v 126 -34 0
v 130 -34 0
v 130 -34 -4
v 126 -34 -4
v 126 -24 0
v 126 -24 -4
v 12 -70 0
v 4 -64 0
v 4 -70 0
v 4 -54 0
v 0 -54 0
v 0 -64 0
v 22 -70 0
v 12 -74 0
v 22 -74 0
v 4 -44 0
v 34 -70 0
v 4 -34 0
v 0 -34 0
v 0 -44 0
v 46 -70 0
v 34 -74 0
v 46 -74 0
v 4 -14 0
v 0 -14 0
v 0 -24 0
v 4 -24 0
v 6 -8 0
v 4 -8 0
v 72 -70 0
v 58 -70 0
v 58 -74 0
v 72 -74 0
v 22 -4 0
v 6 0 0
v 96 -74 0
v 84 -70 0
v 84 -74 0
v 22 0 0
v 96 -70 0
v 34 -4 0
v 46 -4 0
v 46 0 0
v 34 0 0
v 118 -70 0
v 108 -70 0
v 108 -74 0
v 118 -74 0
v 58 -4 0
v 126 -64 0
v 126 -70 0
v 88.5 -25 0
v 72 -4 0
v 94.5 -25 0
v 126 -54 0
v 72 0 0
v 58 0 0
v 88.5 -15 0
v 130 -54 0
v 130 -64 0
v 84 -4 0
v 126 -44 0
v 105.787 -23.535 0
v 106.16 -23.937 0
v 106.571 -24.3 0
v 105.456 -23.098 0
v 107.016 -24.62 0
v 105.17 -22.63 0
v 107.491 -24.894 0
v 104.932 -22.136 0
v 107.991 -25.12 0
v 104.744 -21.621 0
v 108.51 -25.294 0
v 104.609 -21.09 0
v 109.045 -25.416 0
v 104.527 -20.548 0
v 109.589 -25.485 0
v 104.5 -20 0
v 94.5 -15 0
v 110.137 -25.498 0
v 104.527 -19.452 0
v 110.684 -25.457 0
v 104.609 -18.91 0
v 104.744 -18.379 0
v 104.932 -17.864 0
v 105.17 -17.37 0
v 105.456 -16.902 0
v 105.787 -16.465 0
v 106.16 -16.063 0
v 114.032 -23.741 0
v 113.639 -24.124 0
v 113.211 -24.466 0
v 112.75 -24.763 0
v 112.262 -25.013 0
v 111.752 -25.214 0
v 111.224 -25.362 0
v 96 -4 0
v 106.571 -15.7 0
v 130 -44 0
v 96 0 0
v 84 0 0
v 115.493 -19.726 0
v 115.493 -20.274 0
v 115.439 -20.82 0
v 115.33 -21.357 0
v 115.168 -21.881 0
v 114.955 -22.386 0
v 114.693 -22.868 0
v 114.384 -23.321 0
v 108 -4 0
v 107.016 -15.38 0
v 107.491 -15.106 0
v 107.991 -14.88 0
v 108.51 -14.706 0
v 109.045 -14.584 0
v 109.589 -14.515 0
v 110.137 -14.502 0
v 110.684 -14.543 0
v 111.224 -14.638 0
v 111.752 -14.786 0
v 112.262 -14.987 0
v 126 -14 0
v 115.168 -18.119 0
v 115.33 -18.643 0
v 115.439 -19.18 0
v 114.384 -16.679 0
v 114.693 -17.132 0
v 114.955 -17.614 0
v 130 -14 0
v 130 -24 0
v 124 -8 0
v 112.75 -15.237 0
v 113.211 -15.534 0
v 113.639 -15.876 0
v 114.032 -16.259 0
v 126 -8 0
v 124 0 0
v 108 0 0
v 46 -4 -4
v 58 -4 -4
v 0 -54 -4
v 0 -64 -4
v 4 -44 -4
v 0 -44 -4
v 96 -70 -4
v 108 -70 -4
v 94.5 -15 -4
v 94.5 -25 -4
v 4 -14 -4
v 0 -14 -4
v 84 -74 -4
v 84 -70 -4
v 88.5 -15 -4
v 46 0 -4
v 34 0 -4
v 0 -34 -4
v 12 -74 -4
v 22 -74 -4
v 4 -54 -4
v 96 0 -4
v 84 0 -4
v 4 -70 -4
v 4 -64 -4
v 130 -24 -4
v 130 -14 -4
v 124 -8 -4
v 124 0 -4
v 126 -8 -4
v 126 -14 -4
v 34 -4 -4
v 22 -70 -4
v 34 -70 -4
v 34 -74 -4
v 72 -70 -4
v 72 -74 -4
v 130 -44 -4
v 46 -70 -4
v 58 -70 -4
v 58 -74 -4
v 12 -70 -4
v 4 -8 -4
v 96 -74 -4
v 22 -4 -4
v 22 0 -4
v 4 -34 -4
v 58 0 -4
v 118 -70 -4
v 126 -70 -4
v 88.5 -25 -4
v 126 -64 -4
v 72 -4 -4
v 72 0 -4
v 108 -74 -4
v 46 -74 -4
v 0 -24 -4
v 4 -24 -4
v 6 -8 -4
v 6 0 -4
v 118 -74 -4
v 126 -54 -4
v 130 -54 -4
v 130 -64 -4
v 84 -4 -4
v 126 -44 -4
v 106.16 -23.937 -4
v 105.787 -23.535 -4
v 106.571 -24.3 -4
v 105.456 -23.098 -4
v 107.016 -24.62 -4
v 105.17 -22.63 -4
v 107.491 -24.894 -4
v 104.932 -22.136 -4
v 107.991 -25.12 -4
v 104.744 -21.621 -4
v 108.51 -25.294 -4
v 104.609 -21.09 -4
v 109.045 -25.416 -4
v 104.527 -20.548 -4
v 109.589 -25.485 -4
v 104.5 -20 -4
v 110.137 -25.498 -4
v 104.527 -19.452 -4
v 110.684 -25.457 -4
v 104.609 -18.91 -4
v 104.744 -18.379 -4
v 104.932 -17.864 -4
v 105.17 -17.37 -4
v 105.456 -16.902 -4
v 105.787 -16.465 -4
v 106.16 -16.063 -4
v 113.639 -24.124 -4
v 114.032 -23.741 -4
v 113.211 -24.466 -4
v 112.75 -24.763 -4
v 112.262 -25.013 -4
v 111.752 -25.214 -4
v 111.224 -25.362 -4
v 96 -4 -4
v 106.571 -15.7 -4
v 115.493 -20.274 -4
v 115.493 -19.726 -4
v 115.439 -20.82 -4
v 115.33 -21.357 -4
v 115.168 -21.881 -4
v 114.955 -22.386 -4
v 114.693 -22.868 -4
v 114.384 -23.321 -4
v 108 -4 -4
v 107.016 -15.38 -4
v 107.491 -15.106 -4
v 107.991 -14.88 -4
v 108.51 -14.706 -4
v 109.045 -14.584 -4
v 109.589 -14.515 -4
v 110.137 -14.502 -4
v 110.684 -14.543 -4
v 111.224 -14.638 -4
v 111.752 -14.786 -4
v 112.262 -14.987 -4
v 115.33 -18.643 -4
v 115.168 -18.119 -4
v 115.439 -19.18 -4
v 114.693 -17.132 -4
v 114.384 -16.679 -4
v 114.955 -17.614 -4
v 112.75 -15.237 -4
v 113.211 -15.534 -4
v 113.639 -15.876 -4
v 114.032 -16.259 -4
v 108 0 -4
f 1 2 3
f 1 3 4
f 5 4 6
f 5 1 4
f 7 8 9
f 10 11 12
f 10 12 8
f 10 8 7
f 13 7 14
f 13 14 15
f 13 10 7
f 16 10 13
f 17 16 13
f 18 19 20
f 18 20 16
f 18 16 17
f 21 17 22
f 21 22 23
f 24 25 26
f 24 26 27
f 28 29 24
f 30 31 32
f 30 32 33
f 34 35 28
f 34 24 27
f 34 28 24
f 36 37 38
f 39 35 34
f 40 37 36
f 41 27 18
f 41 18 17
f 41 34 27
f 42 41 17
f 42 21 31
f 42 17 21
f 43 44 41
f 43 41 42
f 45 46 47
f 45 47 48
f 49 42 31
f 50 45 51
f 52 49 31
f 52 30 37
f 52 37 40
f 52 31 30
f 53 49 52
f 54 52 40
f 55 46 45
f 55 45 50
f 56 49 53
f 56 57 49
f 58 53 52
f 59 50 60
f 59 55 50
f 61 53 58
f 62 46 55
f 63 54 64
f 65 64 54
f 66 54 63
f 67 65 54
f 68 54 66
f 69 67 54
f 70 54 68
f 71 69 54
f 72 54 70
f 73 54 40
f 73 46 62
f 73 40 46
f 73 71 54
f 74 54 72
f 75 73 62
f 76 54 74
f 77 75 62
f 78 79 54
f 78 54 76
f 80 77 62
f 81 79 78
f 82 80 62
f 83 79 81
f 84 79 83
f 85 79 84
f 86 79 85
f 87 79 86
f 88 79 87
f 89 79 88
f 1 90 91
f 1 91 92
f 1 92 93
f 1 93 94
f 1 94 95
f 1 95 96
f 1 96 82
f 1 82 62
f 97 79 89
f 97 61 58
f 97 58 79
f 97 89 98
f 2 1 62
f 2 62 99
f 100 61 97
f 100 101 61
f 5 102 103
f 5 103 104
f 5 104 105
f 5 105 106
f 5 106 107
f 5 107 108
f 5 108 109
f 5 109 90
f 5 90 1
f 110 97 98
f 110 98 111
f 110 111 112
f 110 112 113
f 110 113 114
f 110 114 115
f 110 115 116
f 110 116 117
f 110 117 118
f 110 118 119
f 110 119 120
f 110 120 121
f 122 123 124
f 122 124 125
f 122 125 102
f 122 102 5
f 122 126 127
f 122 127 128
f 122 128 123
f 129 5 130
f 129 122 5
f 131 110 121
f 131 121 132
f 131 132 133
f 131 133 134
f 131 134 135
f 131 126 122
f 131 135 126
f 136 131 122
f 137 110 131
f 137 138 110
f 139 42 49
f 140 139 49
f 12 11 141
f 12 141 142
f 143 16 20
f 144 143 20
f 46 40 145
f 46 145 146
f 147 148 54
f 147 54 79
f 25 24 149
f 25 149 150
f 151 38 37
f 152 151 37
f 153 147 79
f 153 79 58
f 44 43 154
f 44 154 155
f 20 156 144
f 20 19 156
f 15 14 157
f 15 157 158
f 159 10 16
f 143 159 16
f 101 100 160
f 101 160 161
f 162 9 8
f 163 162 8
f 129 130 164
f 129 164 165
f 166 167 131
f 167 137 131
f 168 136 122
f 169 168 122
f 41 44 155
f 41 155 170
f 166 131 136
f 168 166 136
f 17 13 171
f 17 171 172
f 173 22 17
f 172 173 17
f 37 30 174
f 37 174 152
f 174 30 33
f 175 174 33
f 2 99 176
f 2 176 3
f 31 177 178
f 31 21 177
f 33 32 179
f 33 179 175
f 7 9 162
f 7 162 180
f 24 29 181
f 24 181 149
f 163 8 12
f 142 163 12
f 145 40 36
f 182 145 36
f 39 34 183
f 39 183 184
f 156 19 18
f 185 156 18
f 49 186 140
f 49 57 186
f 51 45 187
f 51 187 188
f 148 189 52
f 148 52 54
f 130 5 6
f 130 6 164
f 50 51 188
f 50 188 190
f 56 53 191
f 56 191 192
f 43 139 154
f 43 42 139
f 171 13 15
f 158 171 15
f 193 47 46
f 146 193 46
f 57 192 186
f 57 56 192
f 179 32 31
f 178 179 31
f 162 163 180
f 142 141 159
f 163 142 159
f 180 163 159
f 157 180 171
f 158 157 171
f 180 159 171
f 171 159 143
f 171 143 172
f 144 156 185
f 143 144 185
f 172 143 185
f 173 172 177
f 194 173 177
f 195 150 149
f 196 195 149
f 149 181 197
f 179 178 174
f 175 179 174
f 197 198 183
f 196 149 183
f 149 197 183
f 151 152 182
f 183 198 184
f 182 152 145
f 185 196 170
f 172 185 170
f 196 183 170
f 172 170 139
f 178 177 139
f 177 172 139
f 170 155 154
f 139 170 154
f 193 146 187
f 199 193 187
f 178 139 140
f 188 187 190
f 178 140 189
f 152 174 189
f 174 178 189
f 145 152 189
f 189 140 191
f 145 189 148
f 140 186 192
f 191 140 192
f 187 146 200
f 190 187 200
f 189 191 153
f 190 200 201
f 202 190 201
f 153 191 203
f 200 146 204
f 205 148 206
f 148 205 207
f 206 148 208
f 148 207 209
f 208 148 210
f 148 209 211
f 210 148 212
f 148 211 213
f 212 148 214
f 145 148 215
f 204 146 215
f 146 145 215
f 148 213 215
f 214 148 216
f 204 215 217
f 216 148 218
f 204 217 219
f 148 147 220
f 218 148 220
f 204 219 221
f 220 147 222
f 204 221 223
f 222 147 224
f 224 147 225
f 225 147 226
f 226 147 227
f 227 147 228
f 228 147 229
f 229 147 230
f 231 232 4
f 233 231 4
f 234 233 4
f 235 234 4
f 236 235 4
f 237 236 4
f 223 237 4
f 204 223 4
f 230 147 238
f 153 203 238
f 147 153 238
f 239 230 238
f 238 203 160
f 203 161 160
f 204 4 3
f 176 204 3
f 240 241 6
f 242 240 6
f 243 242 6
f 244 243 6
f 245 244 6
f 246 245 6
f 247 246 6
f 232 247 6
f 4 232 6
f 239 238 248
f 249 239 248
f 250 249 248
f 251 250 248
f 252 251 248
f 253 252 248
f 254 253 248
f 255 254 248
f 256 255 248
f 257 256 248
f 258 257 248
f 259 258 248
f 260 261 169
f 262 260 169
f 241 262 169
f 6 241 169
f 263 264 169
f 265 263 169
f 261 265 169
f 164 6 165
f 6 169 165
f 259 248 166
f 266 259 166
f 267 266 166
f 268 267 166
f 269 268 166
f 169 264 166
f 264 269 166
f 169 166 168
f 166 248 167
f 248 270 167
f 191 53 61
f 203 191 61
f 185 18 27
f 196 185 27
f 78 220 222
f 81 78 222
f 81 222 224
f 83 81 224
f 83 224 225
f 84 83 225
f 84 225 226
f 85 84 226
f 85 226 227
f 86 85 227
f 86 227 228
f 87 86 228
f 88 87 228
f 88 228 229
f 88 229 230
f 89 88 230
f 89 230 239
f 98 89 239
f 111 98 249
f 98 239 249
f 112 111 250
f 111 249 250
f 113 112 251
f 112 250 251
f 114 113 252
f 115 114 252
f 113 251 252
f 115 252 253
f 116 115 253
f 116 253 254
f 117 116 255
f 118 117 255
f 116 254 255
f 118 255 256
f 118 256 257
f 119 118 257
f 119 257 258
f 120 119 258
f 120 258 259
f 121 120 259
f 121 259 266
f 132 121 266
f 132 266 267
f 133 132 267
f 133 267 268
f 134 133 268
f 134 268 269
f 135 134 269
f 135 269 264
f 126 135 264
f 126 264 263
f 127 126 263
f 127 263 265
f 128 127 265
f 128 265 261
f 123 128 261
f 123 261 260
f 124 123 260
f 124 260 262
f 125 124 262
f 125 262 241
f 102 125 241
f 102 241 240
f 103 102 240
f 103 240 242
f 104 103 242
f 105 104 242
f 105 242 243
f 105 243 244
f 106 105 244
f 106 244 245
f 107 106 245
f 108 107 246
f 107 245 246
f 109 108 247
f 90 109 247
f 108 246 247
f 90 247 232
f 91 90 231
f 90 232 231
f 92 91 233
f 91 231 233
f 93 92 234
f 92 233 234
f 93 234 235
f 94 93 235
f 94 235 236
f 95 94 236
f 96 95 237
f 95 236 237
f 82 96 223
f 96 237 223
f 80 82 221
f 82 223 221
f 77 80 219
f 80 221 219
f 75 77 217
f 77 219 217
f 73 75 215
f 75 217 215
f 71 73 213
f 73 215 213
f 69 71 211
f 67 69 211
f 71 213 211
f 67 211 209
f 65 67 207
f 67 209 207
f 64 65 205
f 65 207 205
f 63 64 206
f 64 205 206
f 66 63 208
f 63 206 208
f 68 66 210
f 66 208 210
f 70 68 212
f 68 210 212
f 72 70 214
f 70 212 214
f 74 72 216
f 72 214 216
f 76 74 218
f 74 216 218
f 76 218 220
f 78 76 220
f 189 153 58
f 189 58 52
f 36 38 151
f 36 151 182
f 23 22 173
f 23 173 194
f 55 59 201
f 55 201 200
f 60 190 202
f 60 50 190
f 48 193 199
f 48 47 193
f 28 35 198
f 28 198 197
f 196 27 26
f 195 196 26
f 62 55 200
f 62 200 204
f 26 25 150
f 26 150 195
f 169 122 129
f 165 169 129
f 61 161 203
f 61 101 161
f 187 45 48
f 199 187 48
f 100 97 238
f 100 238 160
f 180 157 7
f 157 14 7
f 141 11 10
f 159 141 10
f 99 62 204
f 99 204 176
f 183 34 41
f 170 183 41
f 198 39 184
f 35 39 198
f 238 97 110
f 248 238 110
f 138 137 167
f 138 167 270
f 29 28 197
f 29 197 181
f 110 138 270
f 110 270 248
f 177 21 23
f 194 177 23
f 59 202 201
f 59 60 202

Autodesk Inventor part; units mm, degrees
ref_plane "YZ Plane" through (0, 0, 0) normal (1, 0, 0) x (0, 1, 0)
ref_plane "XZ Plane" through (0, 0, 0) normal (0, 1, 0) x (-1, 0, 0)
ref_plane "XY Plane" through (0, 0, 0) normal (0, 0, 1) x (1, 0, 0)
sketch "Sketch1" plane through (0, 0, 0) normal (0, 0, 1) x (1, 0, 0)
  line L0 (0, -74) -> (130, -74)
  line L1 (130, -74) -> (130, 0)
  line L2 (130, 0) -> (0, 0)
  line L3 (0, 0) -> (0, -74)
  dimension "d228" = 130
  dimension "d229" = 74
extrude "Extrusion1" add sketch "Sketch1" against normal blind 4
sketch "Sketch2" plane through (0, 0, 0) normal (0, 0, 1) x (1, 0, 0)
  line L0 (0, -74) -> (0, 0) projected
  line L1 (0, -37) -> (130, -37)
  line L2 (130, 0) -> (130, -74) projected
  line L3 (65, 0) -> (65, -74)
  line L4 (130, -74) -> (0, -74) projected
  line L5 (22, -74) -> (12, -74)
  line L6 (12, -74) -> (12, -70)
  line L7 (22, -70) -> (22, -74)
  line L8 (46, -70) -> (46, -74)
  line L9 (46, -74) -> (34, -74)
  line L10 (34, -74) -> (34, -70)
  line L11 (72, -70) -> (72, -74)
  line L12 (72, -74) -> (58, -74)
  line L13 (58, -74) -> (58, -70)
  line L14 (0, -74) -> (130, -74) projected
  line L15 (96, -74) -> (84, -74)
  line L16 (84, -74) -> (84, -70)
  line L17 (96, -70) -> (96, -74)
  line L18 (118, -70) -> (118, -74)
  line L19 (118, -74) -> (108, -74)
  line L20 (108, -74) -> (108, -70)
  line L21 (0, -54) -> (4, -54)
  line L22 (4, -54) -> (4, -44)
  line L23 (4, -44) -> (0, -44)
  line L24 (0, -44) -> (0, -54)
  line L25 (0, -34) -> (4, -34)
  line L26 (4, -34) -> (4, -24)
  line L27 (4, -24) -> (0, -24)
  line L28 (0, -24) -> (0, -34)
  line L29 (0, 0) -> (0, -74) projected
  line L30 (130, -74) -> (130, 0)
  line L31 (130, 0) -> (130, -74)
  line L32 (0, -70) -> (12, -70)
  line L33 (22, -70) -> (34, -70)
  line L34 (46, -70) -> (58, -70)
  line L35 (72, -70) -> (84, -70)
  line L36 (96, -70) -> (108, -70)
  line L37 (118, -70) -> (130, -70)
  line L38 (0, 0) -> (0, -74)
  line L39 (6, 0) -> (6, -8)
  line L40 (22, -4) -> (22, 0)
  line L41 (46, -4) -> (46, 0)
  line L42 (46, 0) -> (34, 0)
  line L43 (34, 0) -> (34, -4)
  line L44 (72, -4) -> (72, 0)
  line L45 (72, 0) -> (58, 0)
  line L46 (58, 0) -> (58, -4)
  line L47 (96, -4) -> (96, 0)
  line L48 (108, 0) -> (108, -4)
  line L49 (96, 0) -> (84, 0)
  line L50 (84, 0) -> (84, -4)
  line L51 (0, -74) -> (0, 0)
  line L52 (130, 0) -> (130, -74)
  line L53 (130, -74) -> (130, 0)
  line L54 (22, -4) -> (34, -4)
  line L55 (46, -4) -> (58, -4)
  line L56 (72, -4) -> (84, -4)
  line L57 (96, -4) -> (108, -4)
  line L58 (130, -74) -> (130, 0)
  line L59 (130, 0) -> (130, -74)
  line L60 (130, 0) -> (130, -74)
  line L61 (130, -74) -> (130, 0)
  line L62 (0, -70) -> (4, -70)
  line L63 (4, -70) -> (4, -64)
  line L64 (4, -64) -> (0, -64)
  line L65 (0, -64) -> (0, -70)
  line L66 (0, -4) -> (4, -4)
  line L67 (4, -4) -> (4, -14)
  line L68 (4, -14) -> (0, -14)
  line L69 (0, -14) -> (0, -4)
  line L70 (130, -74) -> (130, 0)
  line L71 (130, -54) -> (126, -54)
  line L72 (126, -54) -> (126, -44)
  line L73 (126, -44) -> (130, -44)
  line L74 (130, -44) -> (130, -54)
  line L75 (126, -34) -> (126, -24)
  line L76 (130, -34) -> (126, -34)
  line L77 (126, -24) -> (130, -24)
  line L78 (130, -24) -> (130, -34)
  line L79 (130, 0) -> (130, -74)
  line L80 (130, 0) -> (130, -74)
  line L81 (130, -74) -> (130, 0)
  line L82 (130, -70) -> (126, -70)
  line L83 (126, -70) -> (126, -64)
  line L84 (126, -64) -> (130, -64)
  line L85 (130, -64) -> (130, -70)
  line L86 (130, -4) -> (126, -4)
  line L87 (126, -4) -> (126, -14)
  line L88 (126, -14) -> (130, -14)
  line L89 (130, -14) -> (130, -4)
  line L90 (130, 0) -> (0, 0) projected
  line L91 (6, -8) -> (0, -8)
  line L92 (124, 0) -> (124, -8)
  line L93 (124, -8) -> (130, -8)
  point P0 (58, -74)
  point P1 (72, -74)
  point P2 (0, -24)
  point P3 (0, -34)
  point P4 (84, -74)
  point P5 (96, -74)
  point P6 (0, -44)
  point P7 (130, -70)
  point P8 (0, -70)
  point P9 (0, -14)
  point P10 (0, -64)
  point P11 (126, -70)
  point P12 (130, -64)
  point P13 (130, -54)
  point P14 (130, -44)
  point P15 (130, -34)
  point P16 (130, -14)
  point P17 (0, -8)
  point P18 (126, -8)
  dimension "d234" = 10
  dimension "d235" = 12
  dimension "d236" = 12
  dimension "d237" = 12
  dimension "d238" = 14
  dimension "d240" = 12
  dimension "d242" = 12
  dimension "d243" = 10
  dimension "d244" = 12
  dimension "d245" = 12
  dimension "d246" = 12
  dimension "d249" = 10
  dimension "d251" = 10
  dimension "d255" = 10
  dimension "d262" = 4
  dimension "d267" = 10
  dimension "d268" = 10
  dimension "d271" = 10
  dimension "d272" = 14
  dimension "d274" = 6
  dimension "d278" = 8
extrude "Extrusion2" cut sketch "Sketch2" against normal blind 4 contours L0 L32 L6 L4 | L0 L64 L63 L32 | L7 L33 L10 L4 | L0 L23 L22 L21 | L8 L34 L13 L4 | L0 L27 L26 L25 | L11 L35 L16 L4 | L0 L91 L67 L68 | L76 L75 L77 L2 | L2 L71 L72 L73 | L90 L50 L56 L44 | L46 L55 L41 L90 | L0 L66 L67 L91 | L17 L36 L20 L4 | L0 L90 L39 L91 L67 L66 | L88 L87 L93 L2 | L2 L37 L83 L84 | L90 L48 L57 L47 | L43 L54 L40 L90 | L93 L87 L86 L2 | L2 L4 L18 L37 | L86 L87 L93 L92 L90 L2
sketch "Sketch3" plane through (0, 0, -4) normal (0, 0, -1) x (-1, 0, 0)
  circle A0 centre (-110, -20) radius 5.5
  line L0 (-130, -14) -> (-130, -24) projected
  line L1 (-108, 0) -> (-124, 0) projected
  point P0 (0, 0)
  dimension "d279" = 11
  dimension "d280" = 20
  dimension "d281" = 20
extrude "Extrusion3" cut sketch "Sketch3" against normal blind 4
sketch "Sketch4" plane through (0, 0, -4) normal (0, 0, -1) x (-1, 0, 0)
  line L0 (-94.5, -15) -> (-88.5, -15)
  line L1 (-88.5, -15) -> (-88.5, -25)
  line L2 (-88.5, -25) -> (-94.5, -25)
  line L3 (-94.5, -25) -> (-94.5, -15)
  circle A0 centre (-110, -20) radius 5.5 projected
  point P0 (0, 0)
  point P1 (-94.5, -20)
  dimension "d297" = 10
  dimension "d298" = 10
  dimension "d299" = 6
extrude "Extrusion4" cut sketch "Sketch4" against normal blind 4 contours L0 L1 L2 L3
properties part number "Langbektang houder"
